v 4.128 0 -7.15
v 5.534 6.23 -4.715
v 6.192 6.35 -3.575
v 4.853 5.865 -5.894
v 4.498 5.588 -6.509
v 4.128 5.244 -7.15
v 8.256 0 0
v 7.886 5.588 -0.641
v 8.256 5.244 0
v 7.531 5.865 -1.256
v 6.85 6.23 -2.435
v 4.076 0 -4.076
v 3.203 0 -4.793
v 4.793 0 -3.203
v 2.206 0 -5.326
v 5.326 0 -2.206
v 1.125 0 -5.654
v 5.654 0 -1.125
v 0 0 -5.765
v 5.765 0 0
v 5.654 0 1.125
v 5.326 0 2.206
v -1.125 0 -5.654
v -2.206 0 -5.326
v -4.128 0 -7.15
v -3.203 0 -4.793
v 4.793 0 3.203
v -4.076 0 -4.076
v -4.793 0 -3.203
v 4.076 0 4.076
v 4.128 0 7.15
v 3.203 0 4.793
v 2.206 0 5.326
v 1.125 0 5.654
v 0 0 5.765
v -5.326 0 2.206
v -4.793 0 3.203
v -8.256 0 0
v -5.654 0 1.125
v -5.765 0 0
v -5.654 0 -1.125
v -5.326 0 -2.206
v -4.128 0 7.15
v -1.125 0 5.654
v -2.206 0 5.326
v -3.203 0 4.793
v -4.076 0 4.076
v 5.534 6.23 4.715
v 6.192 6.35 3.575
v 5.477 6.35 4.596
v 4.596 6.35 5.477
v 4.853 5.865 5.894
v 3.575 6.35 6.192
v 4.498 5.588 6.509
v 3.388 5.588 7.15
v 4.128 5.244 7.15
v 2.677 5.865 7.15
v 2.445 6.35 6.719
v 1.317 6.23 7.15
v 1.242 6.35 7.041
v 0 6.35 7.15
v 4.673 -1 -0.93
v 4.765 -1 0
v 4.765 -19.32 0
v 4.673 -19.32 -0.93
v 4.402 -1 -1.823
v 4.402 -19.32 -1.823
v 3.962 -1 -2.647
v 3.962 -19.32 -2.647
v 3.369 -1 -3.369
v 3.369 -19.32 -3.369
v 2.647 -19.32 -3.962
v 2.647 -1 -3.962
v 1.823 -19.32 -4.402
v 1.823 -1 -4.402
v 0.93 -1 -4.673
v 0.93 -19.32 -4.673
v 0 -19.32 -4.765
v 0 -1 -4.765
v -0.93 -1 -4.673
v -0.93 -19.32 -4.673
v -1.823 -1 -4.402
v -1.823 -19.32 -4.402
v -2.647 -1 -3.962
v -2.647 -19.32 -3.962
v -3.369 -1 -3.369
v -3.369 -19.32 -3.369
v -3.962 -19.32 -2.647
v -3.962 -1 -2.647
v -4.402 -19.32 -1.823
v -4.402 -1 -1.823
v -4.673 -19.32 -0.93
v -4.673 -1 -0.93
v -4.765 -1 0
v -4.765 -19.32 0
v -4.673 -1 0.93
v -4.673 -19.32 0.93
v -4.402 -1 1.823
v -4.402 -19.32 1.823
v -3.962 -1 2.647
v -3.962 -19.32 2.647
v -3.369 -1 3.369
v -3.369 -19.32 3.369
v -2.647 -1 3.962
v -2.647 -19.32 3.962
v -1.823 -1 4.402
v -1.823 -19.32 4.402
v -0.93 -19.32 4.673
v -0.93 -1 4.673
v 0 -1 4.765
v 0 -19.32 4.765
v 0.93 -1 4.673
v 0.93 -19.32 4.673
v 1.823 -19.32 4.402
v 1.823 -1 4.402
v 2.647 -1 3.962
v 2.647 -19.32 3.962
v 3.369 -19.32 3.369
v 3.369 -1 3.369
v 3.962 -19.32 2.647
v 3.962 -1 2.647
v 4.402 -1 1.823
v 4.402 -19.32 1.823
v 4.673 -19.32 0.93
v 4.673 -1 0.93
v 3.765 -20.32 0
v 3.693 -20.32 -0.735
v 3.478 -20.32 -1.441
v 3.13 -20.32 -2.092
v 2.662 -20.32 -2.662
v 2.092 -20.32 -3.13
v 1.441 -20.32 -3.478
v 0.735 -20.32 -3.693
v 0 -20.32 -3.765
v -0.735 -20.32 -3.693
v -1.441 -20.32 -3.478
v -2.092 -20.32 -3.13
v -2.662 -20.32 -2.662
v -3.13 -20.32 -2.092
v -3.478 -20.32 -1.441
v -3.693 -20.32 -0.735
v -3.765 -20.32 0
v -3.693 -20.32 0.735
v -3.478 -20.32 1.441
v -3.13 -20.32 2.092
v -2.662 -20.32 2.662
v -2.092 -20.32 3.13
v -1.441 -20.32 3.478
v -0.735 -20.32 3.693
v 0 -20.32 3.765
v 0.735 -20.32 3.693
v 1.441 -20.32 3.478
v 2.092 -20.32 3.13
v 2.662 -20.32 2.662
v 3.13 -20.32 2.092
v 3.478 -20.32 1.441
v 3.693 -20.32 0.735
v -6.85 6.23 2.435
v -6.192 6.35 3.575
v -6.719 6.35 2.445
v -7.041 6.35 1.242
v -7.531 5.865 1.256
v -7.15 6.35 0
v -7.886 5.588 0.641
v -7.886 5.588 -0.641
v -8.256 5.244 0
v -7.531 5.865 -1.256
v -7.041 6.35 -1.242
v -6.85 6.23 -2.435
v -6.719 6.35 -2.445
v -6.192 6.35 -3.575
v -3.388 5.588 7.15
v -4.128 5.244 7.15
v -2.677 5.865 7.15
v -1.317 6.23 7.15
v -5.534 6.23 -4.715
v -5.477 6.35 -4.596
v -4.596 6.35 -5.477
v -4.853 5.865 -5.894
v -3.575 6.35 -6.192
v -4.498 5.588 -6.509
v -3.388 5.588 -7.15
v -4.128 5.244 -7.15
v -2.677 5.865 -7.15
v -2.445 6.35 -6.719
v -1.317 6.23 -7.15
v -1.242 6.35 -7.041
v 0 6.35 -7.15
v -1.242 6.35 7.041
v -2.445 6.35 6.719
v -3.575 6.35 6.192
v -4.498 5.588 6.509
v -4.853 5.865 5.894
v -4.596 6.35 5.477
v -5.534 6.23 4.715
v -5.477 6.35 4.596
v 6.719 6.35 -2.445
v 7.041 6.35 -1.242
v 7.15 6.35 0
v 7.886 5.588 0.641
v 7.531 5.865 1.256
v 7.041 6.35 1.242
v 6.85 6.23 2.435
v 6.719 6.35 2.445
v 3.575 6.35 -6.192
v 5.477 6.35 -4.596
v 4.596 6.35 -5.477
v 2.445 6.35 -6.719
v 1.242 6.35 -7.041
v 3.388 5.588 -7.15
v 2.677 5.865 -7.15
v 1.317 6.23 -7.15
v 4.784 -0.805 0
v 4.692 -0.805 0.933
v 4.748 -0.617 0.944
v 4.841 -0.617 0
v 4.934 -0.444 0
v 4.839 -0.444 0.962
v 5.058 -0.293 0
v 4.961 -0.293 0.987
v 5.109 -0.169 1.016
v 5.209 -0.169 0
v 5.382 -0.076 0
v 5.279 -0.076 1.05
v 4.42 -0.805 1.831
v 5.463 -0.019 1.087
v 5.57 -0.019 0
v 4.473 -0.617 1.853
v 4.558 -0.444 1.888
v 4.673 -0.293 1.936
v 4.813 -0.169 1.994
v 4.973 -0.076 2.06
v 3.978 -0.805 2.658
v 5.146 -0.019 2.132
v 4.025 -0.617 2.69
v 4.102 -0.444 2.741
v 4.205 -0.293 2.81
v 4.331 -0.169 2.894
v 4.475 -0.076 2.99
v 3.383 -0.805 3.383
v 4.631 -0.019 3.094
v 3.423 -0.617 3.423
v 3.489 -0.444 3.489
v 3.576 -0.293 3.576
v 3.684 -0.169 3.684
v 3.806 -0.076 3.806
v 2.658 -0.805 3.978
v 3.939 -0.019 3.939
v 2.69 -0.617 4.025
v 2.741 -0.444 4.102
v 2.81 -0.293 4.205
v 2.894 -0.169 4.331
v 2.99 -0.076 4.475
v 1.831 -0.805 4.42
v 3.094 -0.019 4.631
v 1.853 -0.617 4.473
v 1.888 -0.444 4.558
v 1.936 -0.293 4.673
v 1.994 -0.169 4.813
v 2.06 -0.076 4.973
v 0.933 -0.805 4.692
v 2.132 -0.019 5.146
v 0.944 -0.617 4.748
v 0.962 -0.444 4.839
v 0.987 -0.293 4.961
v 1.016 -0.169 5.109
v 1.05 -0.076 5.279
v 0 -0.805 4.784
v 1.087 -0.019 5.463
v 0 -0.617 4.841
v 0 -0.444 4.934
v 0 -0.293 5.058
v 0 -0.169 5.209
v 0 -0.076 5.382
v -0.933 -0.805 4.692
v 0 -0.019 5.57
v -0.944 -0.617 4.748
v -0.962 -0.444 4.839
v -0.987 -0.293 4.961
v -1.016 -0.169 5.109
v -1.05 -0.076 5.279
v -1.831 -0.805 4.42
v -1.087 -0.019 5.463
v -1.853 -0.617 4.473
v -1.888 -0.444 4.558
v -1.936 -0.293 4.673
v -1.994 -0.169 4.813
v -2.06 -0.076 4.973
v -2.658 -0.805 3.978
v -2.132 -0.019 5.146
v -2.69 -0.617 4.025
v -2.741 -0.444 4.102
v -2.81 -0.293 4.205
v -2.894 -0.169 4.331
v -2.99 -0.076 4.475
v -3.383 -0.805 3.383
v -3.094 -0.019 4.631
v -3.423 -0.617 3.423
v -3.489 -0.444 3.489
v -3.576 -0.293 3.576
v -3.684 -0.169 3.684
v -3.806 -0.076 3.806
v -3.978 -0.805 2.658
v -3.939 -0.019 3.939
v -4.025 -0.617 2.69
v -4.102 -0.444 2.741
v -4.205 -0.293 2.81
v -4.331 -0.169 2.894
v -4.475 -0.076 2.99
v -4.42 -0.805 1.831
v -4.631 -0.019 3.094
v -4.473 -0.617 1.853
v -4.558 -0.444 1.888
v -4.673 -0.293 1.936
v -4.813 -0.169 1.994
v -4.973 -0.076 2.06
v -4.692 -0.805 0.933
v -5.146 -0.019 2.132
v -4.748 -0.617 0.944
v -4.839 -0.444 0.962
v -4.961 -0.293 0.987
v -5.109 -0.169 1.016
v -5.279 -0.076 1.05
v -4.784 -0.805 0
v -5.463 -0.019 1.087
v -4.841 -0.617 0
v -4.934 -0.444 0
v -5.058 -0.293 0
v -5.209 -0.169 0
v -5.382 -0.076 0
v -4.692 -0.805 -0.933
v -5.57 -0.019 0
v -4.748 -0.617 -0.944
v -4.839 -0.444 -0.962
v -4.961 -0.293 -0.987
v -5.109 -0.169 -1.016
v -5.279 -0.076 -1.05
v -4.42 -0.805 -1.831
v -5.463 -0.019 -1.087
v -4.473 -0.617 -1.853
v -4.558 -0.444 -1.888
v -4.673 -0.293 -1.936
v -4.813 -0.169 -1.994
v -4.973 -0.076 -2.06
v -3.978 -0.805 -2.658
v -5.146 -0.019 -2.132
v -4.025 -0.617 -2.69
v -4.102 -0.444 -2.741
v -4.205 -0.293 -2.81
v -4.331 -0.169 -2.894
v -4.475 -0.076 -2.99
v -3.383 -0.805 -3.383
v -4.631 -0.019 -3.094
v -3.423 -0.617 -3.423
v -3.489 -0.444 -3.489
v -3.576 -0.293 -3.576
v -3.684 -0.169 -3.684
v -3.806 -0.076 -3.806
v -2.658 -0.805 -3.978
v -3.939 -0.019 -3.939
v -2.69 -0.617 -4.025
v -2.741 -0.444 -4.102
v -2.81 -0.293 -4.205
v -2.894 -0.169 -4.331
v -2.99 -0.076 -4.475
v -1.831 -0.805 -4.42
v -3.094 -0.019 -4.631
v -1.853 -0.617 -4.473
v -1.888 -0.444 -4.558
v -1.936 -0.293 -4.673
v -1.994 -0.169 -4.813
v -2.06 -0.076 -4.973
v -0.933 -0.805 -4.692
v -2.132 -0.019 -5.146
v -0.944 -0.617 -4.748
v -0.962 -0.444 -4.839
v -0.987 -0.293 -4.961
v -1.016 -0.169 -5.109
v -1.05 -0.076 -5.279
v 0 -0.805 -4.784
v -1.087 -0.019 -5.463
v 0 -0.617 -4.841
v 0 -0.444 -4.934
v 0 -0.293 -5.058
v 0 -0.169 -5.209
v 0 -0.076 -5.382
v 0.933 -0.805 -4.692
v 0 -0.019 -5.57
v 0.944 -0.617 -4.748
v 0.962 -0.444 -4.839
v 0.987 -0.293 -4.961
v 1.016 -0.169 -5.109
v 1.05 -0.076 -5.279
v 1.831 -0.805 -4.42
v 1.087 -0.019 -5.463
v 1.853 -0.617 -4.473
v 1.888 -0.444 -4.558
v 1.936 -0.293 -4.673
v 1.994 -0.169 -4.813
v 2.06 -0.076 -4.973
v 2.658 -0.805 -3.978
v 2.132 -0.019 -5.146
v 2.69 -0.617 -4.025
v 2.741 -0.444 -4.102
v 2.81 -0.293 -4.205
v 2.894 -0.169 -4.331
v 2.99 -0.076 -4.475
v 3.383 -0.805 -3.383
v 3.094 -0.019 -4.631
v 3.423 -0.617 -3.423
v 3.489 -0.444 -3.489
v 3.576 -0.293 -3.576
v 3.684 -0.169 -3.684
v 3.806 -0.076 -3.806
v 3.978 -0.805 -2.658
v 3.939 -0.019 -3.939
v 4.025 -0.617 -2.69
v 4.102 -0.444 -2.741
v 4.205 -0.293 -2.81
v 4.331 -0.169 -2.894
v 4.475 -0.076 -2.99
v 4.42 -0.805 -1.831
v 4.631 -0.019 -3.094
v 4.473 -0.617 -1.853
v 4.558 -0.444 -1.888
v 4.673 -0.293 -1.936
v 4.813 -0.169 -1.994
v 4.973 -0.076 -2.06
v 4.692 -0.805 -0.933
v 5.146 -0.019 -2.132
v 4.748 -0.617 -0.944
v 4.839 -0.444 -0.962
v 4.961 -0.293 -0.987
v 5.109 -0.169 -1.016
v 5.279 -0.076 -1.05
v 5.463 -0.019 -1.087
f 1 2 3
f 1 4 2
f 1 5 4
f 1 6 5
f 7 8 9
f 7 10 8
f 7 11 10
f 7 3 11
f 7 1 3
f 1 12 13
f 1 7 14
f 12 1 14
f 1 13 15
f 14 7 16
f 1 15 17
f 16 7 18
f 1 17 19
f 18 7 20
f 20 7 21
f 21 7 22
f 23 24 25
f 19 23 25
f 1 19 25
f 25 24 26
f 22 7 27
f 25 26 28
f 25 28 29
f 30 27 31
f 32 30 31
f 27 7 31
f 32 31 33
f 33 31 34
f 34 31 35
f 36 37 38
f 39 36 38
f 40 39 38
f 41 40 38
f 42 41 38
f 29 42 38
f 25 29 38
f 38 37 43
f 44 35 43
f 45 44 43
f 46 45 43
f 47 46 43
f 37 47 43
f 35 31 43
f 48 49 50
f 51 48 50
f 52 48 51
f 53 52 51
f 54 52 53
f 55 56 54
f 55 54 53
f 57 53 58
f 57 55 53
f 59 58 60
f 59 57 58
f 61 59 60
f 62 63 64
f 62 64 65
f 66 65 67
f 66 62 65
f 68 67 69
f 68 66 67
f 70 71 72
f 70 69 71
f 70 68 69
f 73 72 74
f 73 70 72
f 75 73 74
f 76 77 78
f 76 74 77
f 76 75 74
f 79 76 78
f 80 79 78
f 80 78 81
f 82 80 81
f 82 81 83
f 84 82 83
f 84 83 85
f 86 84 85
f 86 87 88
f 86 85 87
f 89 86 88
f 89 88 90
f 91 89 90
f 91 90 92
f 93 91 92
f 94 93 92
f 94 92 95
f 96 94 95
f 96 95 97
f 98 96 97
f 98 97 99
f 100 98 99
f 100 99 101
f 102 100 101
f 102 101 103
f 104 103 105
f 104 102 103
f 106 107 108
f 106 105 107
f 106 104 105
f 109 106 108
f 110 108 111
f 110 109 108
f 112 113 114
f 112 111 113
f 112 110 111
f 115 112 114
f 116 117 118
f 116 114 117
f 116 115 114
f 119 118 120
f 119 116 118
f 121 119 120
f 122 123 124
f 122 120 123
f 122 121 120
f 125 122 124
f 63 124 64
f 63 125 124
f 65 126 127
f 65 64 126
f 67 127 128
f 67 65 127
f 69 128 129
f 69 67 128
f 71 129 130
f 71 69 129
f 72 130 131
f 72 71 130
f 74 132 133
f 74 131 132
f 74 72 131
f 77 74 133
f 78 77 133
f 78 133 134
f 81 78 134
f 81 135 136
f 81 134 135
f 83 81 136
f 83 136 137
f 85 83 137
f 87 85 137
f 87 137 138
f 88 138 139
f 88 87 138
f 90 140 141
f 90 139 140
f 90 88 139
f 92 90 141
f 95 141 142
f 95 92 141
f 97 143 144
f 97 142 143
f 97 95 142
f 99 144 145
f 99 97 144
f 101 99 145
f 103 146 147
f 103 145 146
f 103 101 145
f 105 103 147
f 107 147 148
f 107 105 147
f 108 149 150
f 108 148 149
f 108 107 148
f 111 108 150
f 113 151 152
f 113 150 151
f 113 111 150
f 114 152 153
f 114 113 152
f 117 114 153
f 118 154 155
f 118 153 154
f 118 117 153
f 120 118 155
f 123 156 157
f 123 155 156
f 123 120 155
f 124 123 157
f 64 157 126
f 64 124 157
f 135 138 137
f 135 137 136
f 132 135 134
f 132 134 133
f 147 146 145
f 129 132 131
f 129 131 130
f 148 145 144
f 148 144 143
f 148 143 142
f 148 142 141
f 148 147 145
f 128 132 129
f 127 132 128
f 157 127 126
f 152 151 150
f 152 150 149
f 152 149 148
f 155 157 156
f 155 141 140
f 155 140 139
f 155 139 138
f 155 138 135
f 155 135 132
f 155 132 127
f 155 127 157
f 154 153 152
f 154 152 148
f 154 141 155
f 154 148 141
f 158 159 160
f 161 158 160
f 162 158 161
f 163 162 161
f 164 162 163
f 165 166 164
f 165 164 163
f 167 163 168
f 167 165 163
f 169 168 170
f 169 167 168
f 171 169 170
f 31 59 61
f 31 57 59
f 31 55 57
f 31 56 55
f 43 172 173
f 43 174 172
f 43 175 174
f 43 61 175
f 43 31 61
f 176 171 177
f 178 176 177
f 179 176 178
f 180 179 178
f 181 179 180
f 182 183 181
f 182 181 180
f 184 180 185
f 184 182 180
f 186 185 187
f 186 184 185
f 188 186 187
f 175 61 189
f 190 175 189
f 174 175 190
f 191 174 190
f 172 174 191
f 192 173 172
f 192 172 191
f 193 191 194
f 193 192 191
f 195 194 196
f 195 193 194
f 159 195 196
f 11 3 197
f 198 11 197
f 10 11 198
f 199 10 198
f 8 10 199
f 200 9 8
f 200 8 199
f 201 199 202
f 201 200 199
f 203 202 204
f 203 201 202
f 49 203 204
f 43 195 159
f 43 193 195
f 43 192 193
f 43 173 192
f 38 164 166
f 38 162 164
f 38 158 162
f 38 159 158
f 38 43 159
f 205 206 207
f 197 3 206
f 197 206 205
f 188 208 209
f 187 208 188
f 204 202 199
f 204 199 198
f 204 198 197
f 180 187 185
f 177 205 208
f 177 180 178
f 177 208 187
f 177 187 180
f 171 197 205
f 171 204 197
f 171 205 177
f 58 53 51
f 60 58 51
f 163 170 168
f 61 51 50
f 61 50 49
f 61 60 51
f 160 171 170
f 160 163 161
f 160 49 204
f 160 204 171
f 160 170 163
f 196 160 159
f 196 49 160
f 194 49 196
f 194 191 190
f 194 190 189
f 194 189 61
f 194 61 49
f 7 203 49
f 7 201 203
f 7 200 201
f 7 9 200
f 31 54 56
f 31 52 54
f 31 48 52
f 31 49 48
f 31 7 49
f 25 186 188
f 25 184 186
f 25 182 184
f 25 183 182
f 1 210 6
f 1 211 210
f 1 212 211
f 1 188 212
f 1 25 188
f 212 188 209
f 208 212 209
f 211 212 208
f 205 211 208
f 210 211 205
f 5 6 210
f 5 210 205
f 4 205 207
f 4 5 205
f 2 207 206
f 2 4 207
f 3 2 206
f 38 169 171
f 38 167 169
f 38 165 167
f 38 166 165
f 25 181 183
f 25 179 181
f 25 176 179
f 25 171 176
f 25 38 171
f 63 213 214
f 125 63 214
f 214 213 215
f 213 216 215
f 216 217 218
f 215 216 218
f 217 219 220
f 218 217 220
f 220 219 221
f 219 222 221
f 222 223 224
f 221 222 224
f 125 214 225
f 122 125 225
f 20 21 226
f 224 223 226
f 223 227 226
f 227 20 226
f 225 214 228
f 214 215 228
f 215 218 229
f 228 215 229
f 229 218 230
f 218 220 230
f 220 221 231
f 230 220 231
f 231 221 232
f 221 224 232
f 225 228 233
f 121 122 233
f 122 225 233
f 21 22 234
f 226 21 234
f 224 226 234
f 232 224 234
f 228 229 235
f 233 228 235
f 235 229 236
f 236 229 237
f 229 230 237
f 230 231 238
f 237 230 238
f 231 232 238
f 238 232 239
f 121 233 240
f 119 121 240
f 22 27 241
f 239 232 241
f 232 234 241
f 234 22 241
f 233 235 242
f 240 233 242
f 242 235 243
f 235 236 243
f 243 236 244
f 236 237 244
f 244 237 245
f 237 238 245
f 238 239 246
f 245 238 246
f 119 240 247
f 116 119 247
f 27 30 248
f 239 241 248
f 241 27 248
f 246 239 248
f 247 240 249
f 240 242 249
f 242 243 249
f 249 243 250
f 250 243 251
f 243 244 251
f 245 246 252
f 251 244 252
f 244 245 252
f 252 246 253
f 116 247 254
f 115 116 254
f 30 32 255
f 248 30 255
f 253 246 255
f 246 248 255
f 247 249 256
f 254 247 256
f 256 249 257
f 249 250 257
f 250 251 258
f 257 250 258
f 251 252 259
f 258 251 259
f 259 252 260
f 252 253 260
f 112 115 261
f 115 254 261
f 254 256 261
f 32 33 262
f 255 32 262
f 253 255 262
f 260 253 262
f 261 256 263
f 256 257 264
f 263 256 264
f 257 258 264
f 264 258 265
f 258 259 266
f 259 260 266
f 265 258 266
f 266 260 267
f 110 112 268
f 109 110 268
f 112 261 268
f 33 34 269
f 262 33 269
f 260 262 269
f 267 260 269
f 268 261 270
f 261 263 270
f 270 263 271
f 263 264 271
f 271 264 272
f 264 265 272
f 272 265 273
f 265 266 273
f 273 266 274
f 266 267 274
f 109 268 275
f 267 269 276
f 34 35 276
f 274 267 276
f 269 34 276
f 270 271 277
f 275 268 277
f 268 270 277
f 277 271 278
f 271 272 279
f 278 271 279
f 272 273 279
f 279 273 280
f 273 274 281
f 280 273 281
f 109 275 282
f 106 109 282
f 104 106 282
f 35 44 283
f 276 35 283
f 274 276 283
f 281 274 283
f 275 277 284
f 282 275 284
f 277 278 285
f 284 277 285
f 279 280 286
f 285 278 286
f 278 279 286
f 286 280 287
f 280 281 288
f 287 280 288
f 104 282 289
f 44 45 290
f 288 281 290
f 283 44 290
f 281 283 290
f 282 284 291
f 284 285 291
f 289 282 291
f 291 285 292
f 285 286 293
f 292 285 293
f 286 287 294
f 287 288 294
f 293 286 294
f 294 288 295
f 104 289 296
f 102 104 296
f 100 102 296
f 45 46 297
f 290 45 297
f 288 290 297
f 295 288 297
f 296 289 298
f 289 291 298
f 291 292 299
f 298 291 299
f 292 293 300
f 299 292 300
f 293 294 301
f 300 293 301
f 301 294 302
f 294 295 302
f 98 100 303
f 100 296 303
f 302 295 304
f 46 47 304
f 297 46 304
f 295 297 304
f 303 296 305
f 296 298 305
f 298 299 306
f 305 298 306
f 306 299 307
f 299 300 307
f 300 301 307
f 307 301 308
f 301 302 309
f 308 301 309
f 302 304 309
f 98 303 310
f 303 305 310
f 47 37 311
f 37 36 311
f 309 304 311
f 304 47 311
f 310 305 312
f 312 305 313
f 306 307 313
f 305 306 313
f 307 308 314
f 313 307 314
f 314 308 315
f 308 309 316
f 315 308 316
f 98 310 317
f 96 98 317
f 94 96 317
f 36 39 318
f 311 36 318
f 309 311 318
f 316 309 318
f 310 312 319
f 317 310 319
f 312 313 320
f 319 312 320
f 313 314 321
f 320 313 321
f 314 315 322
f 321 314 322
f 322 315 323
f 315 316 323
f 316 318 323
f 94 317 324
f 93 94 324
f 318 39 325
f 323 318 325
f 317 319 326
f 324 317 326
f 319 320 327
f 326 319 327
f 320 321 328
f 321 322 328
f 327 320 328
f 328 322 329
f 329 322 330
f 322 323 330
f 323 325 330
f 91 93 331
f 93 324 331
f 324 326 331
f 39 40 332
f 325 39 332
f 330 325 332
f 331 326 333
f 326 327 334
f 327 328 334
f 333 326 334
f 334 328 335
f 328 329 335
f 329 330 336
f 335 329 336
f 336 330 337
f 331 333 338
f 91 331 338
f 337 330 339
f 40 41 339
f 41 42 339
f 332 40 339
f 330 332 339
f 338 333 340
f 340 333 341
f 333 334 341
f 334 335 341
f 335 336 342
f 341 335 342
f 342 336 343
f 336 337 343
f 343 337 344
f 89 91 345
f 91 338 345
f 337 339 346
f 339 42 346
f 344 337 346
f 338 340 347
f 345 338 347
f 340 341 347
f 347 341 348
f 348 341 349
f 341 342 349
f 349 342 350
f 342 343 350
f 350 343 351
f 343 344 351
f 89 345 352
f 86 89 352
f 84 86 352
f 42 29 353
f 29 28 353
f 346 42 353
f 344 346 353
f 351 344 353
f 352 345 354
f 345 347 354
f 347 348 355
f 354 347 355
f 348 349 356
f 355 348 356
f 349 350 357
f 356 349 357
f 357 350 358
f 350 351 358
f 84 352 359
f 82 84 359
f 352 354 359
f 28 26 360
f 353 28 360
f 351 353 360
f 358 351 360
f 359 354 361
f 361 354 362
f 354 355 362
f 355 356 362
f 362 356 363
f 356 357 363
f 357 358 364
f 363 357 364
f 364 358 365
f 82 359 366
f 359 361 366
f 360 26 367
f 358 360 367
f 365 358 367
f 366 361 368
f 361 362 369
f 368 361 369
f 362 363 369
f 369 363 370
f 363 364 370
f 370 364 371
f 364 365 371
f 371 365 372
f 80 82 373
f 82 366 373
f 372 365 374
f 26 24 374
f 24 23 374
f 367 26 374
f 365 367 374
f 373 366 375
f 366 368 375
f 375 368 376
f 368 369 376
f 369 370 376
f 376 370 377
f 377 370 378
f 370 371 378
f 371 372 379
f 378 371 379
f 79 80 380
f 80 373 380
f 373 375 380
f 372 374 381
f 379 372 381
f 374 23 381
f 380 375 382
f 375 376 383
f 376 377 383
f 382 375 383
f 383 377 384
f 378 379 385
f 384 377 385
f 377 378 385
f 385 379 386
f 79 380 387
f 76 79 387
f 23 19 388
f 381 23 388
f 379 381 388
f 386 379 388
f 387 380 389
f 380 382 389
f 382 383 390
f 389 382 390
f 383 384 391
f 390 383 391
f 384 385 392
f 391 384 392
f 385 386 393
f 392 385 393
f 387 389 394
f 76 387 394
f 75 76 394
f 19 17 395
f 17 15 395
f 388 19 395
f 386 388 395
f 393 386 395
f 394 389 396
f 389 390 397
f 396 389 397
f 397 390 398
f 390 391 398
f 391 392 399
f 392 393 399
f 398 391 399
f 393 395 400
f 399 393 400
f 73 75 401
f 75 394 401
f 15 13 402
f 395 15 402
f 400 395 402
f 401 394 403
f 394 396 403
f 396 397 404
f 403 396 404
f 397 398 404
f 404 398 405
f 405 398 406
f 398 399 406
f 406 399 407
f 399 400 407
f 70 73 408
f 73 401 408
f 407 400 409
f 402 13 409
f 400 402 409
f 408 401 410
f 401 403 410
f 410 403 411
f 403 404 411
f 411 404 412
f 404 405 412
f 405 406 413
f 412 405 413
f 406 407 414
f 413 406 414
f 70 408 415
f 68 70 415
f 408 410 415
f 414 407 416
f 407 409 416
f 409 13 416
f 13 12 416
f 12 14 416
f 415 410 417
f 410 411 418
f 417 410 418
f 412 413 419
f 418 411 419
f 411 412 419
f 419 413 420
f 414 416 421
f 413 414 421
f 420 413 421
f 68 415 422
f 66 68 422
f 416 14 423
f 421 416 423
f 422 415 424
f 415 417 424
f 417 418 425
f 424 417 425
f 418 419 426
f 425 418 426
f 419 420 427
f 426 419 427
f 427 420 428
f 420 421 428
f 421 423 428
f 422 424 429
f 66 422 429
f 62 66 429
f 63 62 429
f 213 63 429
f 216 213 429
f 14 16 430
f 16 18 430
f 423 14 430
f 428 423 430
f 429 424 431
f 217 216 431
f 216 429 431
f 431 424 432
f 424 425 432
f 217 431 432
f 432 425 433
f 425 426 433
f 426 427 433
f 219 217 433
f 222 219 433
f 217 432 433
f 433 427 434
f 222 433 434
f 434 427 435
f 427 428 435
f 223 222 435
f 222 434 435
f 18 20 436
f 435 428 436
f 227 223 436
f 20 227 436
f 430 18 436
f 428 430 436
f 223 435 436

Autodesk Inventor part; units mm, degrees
ref_plane "YZ Plane" through (0, 0, 0) normal (1, 0, 0) x (0, 1, 0)
ref_plane "XZ Plane" through (0, 0, 0) normal (0, 1, 0) x (-1, 0, 0)
ref_plane "XY Plane" through (0, 0, 0) normal (0, 0, 1) x (1, 0, 0)
sketch "Sketch1" plane through (0, 0, 0) normal (0, 1, 0) x (-1, 0, 0)
  line L0 (8.2561, 0) -> (4.1281, -7.15)
  line L1 (4.1281, -7.15) -> (-4.1281, -7.15)
  line L2 (-4.1281, -7.15) -> (-8.2561, 0)
  line L3 (-8.2561, 0) -> (-4.1281, 7.15)
  line L4 (-4.1281, 7.15) -> (4.1281, 7.15)
  line L5 (4.1281, 7.15) -> (8.2561, 0)
  point P0 (0, 0)
  point P1 (0, 0)
  dimension "d0" = 14.3
extrude "Extrusion1" add sketch "Sketch1" along normal blind 6.35
sketch "Sketch2" plane through (0, 6.35, 0) normal (0, 1, 0) x (1, 0, 0)
  circle A0 centre (0, 0) radius 7.15
  dimension "d3" = 14.3
extrude "Extrusion2" cut sketch "Sketch2" against normal through all draft 45 keep common part
sketch "Sketch3" plane through (0, 0, 0) normal (0, -1, 0) x (1, 0, 0)
  circle A0 centre (0, 0) radius 4.765
  dimension "d6" = 9.53
extrude "Extrusion3" add sketch "Sketch3" along normal blind 20.32
chamfer "Chamfer1" distance 1 angle 45 1 edges at (-4.765, -20.32, 0)
fillet "Fillet1" radius 1 1 edges at (-4.765, 0, 0)
thread "Thread1" size "M10x1.5" class "6g" standard "ANSI Metric M Profile" length 18.32
properties part number "Bolt" material "Stainless Steel"
